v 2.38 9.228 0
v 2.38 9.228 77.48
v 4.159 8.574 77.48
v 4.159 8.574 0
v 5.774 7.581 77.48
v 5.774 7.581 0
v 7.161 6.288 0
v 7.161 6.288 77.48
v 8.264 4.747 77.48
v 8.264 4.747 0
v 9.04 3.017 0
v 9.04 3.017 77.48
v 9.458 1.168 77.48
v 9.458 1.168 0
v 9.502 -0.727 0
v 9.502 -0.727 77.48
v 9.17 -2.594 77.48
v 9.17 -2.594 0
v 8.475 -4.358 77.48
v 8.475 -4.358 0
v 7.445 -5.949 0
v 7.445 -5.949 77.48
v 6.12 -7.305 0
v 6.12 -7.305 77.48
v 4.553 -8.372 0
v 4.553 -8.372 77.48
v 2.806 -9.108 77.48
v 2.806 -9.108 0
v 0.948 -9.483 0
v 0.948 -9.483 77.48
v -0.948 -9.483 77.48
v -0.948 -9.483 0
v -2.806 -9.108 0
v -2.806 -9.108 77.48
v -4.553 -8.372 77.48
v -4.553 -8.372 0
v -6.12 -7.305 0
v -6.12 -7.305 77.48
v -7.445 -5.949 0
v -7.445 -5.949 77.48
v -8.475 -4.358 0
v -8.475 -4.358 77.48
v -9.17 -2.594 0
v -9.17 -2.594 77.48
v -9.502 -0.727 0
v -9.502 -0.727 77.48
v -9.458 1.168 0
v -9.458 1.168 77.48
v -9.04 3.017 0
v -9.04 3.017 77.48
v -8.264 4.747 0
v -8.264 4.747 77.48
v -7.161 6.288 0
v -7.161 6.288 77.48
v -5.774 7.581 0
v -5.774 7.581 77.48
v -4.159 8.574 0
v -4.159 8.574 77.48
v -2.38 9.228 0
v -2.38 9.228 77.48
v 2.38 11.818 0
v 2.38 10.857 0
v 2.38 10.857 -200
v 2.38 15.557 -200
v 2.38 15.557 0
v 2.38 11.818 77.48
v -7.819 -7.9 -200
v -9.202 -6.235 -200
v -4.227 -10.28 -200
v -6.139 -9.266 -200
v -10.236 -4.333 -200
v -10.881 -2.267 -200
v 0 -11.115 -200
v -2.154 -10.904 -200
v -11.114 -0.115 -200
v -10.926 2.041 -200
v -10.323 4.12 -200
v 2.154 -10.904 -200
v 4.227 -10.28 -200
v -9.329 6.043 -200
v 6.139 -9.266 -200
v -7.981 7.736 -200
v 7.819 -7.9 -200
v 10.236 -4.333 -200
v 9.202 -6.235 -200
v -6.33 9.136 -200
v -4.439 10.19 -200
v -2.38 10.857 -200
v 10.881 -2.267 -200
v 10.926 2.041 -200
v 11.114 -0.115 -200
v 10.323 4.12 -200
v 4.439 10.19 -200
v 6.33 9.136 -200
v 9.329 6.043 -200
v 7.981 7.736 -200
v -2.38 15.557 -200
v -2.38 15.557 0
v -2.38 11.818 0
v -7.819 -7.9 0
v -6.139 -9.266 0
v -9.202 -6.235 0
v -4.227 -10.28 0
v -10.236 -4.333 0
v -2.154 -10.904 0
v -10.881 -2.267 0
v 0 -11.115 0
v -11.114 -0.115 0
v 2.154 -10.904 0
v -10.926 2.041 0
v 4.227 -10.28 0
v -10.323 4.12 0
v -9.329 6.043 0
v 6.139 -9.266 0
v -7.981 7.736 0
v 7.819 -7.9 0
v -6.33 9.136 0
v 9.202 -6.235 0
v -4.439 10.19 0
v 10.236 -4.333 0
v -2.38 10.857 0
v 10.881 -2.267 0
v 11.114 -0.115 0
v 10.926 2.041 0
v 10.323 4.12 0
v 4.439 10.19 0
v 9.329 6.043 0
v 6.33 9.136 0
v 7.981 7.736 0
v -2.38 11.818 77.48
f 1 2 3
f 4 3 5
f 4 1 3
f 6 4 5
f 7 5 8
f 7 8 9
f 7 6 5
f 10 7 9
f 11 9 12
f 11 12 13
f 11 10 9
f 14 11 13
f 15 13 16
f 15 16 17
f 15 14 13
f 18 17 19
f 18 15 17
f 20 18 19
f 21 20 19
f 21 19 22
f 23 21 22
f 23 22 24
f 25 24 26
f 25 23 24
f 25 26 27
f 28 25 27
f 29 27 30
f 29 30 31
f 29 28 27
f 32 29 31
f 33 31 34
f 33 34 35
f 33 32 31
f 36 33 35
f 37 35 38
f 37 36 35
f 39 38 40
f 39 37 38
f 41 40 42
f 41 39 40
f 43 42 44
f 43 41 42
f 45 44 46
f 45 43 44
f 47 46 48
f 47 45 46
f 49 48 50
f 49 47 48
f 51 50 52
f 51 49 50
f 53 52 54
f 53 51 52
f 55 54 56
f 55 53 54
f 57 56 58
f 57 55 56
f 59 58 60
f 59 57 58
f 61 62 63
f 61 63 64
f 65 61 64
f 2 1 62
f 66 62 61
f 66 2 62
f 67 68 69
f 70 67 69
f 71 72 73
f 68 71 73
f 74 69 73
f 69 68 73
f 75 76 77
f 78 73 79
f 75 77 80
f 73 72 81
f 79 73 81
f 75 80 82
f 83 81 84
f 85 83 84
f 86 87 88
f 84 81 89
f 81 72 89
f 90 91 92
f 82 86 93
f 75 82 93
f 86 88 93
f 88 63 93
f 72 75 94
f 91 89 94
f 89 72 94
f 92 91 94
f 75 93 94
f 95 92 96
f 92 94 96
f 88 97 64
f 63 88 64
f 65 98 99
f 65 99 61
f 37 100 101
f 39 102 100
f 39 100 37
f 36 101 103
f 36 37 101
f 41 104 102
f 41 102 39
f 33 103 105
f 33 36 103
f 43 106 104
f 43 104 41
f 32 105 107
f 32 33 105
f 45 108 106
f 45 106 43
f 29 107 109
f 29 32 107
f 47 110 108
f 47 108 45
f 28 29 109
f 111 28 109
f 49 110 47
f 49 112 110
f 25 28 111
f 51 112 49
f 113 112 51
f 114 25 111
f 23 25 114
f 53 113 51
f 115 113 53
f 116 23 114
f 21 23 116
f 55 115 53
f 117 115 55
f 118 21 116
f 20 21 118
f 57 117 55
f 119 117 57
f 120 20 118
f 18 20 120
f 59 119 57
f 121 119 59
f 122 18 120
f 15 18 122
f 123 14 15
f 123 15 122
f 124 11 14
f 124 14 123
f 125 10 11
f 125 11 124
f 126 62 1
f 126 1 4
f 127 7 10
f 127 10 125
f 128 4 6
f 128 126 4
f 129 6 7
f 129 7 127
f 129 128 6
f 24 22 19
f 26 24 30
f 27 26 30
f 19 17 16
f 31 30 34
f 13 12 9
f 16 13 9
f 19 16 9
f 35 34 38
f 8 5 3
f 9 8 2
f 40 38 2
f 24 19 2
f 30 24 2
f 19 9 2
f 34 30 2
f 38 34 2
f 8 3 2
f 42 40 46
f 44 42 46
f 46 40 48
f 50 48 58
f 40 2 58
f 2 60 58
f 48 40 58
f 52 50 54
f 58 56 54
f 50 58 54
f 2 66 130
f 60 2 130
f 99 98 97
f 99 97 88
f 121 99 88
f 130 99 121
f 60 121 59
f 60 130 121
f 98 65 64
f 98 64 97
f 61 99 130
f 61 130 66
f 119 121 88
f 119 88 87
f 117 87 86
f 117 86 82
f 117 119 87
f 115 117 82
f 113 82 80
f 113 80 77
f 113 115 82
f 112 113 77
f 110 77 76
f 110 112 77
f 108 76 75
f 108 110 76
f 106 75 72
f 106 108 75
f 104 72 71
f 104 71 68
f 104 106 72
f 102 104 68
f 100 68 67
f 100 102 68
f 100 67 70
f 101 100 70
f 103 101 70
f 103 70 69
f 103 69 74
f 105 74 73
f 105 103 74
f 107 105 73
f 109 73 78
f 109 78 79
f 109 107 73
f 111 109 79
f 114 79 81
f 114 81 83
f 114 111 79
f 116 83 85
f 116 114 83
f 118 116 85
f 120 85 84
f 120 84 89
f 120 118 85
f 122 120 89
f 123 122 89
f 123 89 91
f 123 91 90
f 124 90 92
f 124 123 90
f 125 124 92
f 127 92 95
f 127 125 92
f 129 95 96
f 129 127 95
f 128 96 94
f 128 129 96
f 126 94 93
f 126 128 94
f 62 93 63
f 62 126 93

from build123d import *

# Parameters (mm, degrees)
BOSS_EXTRUDE1_DEPTH = 77.48
BOSS_EXTRUDE2_DEPTH = 200


with BuildPart() as part:
    # Sketch1 → Boss-Extrude1 (new body)
    with BuildSketch(Plane.XY):
        with BuildLine():
            Line((-2.38, 11.818027958), (2.38, 11.818027958))
            Line((2.38, 11.818027958), (2.38, 9.228027958))
            ThreePointArc((2.38, 9.228027958), (0, -9.53), (-2.38, 9.228027958))
            Line((-2.38, 9.228027958), (-2.38, 11.818027958))
        make_face()
    extrude(amount=BOSS_EXTRUDE1_DEPTH)

    # Sketch2 → Boss-Extrude2 (add)
    with BuildSketch(Plane(origin=(0, 0, 0), x_dir=(-1, 0, 0), z_dir=(0, 0, -1))):
        with BuildLine():
            Line((-2.38, 15.557201527), (2.38, 15.557201527))
            Line((2.38, 15.557201527), (2.38, 10.857201527))
            ThreePointArc((2.38, 10.857201527), (0, -11.115), (-2.38, 10.857201527))
            Line((-2.38, 10.857201527), (-2.38, 15.557201527))
        make_face()
    extrude(amount=BOSS_EXTRUDE2_DEPTH)


solid = part.part
